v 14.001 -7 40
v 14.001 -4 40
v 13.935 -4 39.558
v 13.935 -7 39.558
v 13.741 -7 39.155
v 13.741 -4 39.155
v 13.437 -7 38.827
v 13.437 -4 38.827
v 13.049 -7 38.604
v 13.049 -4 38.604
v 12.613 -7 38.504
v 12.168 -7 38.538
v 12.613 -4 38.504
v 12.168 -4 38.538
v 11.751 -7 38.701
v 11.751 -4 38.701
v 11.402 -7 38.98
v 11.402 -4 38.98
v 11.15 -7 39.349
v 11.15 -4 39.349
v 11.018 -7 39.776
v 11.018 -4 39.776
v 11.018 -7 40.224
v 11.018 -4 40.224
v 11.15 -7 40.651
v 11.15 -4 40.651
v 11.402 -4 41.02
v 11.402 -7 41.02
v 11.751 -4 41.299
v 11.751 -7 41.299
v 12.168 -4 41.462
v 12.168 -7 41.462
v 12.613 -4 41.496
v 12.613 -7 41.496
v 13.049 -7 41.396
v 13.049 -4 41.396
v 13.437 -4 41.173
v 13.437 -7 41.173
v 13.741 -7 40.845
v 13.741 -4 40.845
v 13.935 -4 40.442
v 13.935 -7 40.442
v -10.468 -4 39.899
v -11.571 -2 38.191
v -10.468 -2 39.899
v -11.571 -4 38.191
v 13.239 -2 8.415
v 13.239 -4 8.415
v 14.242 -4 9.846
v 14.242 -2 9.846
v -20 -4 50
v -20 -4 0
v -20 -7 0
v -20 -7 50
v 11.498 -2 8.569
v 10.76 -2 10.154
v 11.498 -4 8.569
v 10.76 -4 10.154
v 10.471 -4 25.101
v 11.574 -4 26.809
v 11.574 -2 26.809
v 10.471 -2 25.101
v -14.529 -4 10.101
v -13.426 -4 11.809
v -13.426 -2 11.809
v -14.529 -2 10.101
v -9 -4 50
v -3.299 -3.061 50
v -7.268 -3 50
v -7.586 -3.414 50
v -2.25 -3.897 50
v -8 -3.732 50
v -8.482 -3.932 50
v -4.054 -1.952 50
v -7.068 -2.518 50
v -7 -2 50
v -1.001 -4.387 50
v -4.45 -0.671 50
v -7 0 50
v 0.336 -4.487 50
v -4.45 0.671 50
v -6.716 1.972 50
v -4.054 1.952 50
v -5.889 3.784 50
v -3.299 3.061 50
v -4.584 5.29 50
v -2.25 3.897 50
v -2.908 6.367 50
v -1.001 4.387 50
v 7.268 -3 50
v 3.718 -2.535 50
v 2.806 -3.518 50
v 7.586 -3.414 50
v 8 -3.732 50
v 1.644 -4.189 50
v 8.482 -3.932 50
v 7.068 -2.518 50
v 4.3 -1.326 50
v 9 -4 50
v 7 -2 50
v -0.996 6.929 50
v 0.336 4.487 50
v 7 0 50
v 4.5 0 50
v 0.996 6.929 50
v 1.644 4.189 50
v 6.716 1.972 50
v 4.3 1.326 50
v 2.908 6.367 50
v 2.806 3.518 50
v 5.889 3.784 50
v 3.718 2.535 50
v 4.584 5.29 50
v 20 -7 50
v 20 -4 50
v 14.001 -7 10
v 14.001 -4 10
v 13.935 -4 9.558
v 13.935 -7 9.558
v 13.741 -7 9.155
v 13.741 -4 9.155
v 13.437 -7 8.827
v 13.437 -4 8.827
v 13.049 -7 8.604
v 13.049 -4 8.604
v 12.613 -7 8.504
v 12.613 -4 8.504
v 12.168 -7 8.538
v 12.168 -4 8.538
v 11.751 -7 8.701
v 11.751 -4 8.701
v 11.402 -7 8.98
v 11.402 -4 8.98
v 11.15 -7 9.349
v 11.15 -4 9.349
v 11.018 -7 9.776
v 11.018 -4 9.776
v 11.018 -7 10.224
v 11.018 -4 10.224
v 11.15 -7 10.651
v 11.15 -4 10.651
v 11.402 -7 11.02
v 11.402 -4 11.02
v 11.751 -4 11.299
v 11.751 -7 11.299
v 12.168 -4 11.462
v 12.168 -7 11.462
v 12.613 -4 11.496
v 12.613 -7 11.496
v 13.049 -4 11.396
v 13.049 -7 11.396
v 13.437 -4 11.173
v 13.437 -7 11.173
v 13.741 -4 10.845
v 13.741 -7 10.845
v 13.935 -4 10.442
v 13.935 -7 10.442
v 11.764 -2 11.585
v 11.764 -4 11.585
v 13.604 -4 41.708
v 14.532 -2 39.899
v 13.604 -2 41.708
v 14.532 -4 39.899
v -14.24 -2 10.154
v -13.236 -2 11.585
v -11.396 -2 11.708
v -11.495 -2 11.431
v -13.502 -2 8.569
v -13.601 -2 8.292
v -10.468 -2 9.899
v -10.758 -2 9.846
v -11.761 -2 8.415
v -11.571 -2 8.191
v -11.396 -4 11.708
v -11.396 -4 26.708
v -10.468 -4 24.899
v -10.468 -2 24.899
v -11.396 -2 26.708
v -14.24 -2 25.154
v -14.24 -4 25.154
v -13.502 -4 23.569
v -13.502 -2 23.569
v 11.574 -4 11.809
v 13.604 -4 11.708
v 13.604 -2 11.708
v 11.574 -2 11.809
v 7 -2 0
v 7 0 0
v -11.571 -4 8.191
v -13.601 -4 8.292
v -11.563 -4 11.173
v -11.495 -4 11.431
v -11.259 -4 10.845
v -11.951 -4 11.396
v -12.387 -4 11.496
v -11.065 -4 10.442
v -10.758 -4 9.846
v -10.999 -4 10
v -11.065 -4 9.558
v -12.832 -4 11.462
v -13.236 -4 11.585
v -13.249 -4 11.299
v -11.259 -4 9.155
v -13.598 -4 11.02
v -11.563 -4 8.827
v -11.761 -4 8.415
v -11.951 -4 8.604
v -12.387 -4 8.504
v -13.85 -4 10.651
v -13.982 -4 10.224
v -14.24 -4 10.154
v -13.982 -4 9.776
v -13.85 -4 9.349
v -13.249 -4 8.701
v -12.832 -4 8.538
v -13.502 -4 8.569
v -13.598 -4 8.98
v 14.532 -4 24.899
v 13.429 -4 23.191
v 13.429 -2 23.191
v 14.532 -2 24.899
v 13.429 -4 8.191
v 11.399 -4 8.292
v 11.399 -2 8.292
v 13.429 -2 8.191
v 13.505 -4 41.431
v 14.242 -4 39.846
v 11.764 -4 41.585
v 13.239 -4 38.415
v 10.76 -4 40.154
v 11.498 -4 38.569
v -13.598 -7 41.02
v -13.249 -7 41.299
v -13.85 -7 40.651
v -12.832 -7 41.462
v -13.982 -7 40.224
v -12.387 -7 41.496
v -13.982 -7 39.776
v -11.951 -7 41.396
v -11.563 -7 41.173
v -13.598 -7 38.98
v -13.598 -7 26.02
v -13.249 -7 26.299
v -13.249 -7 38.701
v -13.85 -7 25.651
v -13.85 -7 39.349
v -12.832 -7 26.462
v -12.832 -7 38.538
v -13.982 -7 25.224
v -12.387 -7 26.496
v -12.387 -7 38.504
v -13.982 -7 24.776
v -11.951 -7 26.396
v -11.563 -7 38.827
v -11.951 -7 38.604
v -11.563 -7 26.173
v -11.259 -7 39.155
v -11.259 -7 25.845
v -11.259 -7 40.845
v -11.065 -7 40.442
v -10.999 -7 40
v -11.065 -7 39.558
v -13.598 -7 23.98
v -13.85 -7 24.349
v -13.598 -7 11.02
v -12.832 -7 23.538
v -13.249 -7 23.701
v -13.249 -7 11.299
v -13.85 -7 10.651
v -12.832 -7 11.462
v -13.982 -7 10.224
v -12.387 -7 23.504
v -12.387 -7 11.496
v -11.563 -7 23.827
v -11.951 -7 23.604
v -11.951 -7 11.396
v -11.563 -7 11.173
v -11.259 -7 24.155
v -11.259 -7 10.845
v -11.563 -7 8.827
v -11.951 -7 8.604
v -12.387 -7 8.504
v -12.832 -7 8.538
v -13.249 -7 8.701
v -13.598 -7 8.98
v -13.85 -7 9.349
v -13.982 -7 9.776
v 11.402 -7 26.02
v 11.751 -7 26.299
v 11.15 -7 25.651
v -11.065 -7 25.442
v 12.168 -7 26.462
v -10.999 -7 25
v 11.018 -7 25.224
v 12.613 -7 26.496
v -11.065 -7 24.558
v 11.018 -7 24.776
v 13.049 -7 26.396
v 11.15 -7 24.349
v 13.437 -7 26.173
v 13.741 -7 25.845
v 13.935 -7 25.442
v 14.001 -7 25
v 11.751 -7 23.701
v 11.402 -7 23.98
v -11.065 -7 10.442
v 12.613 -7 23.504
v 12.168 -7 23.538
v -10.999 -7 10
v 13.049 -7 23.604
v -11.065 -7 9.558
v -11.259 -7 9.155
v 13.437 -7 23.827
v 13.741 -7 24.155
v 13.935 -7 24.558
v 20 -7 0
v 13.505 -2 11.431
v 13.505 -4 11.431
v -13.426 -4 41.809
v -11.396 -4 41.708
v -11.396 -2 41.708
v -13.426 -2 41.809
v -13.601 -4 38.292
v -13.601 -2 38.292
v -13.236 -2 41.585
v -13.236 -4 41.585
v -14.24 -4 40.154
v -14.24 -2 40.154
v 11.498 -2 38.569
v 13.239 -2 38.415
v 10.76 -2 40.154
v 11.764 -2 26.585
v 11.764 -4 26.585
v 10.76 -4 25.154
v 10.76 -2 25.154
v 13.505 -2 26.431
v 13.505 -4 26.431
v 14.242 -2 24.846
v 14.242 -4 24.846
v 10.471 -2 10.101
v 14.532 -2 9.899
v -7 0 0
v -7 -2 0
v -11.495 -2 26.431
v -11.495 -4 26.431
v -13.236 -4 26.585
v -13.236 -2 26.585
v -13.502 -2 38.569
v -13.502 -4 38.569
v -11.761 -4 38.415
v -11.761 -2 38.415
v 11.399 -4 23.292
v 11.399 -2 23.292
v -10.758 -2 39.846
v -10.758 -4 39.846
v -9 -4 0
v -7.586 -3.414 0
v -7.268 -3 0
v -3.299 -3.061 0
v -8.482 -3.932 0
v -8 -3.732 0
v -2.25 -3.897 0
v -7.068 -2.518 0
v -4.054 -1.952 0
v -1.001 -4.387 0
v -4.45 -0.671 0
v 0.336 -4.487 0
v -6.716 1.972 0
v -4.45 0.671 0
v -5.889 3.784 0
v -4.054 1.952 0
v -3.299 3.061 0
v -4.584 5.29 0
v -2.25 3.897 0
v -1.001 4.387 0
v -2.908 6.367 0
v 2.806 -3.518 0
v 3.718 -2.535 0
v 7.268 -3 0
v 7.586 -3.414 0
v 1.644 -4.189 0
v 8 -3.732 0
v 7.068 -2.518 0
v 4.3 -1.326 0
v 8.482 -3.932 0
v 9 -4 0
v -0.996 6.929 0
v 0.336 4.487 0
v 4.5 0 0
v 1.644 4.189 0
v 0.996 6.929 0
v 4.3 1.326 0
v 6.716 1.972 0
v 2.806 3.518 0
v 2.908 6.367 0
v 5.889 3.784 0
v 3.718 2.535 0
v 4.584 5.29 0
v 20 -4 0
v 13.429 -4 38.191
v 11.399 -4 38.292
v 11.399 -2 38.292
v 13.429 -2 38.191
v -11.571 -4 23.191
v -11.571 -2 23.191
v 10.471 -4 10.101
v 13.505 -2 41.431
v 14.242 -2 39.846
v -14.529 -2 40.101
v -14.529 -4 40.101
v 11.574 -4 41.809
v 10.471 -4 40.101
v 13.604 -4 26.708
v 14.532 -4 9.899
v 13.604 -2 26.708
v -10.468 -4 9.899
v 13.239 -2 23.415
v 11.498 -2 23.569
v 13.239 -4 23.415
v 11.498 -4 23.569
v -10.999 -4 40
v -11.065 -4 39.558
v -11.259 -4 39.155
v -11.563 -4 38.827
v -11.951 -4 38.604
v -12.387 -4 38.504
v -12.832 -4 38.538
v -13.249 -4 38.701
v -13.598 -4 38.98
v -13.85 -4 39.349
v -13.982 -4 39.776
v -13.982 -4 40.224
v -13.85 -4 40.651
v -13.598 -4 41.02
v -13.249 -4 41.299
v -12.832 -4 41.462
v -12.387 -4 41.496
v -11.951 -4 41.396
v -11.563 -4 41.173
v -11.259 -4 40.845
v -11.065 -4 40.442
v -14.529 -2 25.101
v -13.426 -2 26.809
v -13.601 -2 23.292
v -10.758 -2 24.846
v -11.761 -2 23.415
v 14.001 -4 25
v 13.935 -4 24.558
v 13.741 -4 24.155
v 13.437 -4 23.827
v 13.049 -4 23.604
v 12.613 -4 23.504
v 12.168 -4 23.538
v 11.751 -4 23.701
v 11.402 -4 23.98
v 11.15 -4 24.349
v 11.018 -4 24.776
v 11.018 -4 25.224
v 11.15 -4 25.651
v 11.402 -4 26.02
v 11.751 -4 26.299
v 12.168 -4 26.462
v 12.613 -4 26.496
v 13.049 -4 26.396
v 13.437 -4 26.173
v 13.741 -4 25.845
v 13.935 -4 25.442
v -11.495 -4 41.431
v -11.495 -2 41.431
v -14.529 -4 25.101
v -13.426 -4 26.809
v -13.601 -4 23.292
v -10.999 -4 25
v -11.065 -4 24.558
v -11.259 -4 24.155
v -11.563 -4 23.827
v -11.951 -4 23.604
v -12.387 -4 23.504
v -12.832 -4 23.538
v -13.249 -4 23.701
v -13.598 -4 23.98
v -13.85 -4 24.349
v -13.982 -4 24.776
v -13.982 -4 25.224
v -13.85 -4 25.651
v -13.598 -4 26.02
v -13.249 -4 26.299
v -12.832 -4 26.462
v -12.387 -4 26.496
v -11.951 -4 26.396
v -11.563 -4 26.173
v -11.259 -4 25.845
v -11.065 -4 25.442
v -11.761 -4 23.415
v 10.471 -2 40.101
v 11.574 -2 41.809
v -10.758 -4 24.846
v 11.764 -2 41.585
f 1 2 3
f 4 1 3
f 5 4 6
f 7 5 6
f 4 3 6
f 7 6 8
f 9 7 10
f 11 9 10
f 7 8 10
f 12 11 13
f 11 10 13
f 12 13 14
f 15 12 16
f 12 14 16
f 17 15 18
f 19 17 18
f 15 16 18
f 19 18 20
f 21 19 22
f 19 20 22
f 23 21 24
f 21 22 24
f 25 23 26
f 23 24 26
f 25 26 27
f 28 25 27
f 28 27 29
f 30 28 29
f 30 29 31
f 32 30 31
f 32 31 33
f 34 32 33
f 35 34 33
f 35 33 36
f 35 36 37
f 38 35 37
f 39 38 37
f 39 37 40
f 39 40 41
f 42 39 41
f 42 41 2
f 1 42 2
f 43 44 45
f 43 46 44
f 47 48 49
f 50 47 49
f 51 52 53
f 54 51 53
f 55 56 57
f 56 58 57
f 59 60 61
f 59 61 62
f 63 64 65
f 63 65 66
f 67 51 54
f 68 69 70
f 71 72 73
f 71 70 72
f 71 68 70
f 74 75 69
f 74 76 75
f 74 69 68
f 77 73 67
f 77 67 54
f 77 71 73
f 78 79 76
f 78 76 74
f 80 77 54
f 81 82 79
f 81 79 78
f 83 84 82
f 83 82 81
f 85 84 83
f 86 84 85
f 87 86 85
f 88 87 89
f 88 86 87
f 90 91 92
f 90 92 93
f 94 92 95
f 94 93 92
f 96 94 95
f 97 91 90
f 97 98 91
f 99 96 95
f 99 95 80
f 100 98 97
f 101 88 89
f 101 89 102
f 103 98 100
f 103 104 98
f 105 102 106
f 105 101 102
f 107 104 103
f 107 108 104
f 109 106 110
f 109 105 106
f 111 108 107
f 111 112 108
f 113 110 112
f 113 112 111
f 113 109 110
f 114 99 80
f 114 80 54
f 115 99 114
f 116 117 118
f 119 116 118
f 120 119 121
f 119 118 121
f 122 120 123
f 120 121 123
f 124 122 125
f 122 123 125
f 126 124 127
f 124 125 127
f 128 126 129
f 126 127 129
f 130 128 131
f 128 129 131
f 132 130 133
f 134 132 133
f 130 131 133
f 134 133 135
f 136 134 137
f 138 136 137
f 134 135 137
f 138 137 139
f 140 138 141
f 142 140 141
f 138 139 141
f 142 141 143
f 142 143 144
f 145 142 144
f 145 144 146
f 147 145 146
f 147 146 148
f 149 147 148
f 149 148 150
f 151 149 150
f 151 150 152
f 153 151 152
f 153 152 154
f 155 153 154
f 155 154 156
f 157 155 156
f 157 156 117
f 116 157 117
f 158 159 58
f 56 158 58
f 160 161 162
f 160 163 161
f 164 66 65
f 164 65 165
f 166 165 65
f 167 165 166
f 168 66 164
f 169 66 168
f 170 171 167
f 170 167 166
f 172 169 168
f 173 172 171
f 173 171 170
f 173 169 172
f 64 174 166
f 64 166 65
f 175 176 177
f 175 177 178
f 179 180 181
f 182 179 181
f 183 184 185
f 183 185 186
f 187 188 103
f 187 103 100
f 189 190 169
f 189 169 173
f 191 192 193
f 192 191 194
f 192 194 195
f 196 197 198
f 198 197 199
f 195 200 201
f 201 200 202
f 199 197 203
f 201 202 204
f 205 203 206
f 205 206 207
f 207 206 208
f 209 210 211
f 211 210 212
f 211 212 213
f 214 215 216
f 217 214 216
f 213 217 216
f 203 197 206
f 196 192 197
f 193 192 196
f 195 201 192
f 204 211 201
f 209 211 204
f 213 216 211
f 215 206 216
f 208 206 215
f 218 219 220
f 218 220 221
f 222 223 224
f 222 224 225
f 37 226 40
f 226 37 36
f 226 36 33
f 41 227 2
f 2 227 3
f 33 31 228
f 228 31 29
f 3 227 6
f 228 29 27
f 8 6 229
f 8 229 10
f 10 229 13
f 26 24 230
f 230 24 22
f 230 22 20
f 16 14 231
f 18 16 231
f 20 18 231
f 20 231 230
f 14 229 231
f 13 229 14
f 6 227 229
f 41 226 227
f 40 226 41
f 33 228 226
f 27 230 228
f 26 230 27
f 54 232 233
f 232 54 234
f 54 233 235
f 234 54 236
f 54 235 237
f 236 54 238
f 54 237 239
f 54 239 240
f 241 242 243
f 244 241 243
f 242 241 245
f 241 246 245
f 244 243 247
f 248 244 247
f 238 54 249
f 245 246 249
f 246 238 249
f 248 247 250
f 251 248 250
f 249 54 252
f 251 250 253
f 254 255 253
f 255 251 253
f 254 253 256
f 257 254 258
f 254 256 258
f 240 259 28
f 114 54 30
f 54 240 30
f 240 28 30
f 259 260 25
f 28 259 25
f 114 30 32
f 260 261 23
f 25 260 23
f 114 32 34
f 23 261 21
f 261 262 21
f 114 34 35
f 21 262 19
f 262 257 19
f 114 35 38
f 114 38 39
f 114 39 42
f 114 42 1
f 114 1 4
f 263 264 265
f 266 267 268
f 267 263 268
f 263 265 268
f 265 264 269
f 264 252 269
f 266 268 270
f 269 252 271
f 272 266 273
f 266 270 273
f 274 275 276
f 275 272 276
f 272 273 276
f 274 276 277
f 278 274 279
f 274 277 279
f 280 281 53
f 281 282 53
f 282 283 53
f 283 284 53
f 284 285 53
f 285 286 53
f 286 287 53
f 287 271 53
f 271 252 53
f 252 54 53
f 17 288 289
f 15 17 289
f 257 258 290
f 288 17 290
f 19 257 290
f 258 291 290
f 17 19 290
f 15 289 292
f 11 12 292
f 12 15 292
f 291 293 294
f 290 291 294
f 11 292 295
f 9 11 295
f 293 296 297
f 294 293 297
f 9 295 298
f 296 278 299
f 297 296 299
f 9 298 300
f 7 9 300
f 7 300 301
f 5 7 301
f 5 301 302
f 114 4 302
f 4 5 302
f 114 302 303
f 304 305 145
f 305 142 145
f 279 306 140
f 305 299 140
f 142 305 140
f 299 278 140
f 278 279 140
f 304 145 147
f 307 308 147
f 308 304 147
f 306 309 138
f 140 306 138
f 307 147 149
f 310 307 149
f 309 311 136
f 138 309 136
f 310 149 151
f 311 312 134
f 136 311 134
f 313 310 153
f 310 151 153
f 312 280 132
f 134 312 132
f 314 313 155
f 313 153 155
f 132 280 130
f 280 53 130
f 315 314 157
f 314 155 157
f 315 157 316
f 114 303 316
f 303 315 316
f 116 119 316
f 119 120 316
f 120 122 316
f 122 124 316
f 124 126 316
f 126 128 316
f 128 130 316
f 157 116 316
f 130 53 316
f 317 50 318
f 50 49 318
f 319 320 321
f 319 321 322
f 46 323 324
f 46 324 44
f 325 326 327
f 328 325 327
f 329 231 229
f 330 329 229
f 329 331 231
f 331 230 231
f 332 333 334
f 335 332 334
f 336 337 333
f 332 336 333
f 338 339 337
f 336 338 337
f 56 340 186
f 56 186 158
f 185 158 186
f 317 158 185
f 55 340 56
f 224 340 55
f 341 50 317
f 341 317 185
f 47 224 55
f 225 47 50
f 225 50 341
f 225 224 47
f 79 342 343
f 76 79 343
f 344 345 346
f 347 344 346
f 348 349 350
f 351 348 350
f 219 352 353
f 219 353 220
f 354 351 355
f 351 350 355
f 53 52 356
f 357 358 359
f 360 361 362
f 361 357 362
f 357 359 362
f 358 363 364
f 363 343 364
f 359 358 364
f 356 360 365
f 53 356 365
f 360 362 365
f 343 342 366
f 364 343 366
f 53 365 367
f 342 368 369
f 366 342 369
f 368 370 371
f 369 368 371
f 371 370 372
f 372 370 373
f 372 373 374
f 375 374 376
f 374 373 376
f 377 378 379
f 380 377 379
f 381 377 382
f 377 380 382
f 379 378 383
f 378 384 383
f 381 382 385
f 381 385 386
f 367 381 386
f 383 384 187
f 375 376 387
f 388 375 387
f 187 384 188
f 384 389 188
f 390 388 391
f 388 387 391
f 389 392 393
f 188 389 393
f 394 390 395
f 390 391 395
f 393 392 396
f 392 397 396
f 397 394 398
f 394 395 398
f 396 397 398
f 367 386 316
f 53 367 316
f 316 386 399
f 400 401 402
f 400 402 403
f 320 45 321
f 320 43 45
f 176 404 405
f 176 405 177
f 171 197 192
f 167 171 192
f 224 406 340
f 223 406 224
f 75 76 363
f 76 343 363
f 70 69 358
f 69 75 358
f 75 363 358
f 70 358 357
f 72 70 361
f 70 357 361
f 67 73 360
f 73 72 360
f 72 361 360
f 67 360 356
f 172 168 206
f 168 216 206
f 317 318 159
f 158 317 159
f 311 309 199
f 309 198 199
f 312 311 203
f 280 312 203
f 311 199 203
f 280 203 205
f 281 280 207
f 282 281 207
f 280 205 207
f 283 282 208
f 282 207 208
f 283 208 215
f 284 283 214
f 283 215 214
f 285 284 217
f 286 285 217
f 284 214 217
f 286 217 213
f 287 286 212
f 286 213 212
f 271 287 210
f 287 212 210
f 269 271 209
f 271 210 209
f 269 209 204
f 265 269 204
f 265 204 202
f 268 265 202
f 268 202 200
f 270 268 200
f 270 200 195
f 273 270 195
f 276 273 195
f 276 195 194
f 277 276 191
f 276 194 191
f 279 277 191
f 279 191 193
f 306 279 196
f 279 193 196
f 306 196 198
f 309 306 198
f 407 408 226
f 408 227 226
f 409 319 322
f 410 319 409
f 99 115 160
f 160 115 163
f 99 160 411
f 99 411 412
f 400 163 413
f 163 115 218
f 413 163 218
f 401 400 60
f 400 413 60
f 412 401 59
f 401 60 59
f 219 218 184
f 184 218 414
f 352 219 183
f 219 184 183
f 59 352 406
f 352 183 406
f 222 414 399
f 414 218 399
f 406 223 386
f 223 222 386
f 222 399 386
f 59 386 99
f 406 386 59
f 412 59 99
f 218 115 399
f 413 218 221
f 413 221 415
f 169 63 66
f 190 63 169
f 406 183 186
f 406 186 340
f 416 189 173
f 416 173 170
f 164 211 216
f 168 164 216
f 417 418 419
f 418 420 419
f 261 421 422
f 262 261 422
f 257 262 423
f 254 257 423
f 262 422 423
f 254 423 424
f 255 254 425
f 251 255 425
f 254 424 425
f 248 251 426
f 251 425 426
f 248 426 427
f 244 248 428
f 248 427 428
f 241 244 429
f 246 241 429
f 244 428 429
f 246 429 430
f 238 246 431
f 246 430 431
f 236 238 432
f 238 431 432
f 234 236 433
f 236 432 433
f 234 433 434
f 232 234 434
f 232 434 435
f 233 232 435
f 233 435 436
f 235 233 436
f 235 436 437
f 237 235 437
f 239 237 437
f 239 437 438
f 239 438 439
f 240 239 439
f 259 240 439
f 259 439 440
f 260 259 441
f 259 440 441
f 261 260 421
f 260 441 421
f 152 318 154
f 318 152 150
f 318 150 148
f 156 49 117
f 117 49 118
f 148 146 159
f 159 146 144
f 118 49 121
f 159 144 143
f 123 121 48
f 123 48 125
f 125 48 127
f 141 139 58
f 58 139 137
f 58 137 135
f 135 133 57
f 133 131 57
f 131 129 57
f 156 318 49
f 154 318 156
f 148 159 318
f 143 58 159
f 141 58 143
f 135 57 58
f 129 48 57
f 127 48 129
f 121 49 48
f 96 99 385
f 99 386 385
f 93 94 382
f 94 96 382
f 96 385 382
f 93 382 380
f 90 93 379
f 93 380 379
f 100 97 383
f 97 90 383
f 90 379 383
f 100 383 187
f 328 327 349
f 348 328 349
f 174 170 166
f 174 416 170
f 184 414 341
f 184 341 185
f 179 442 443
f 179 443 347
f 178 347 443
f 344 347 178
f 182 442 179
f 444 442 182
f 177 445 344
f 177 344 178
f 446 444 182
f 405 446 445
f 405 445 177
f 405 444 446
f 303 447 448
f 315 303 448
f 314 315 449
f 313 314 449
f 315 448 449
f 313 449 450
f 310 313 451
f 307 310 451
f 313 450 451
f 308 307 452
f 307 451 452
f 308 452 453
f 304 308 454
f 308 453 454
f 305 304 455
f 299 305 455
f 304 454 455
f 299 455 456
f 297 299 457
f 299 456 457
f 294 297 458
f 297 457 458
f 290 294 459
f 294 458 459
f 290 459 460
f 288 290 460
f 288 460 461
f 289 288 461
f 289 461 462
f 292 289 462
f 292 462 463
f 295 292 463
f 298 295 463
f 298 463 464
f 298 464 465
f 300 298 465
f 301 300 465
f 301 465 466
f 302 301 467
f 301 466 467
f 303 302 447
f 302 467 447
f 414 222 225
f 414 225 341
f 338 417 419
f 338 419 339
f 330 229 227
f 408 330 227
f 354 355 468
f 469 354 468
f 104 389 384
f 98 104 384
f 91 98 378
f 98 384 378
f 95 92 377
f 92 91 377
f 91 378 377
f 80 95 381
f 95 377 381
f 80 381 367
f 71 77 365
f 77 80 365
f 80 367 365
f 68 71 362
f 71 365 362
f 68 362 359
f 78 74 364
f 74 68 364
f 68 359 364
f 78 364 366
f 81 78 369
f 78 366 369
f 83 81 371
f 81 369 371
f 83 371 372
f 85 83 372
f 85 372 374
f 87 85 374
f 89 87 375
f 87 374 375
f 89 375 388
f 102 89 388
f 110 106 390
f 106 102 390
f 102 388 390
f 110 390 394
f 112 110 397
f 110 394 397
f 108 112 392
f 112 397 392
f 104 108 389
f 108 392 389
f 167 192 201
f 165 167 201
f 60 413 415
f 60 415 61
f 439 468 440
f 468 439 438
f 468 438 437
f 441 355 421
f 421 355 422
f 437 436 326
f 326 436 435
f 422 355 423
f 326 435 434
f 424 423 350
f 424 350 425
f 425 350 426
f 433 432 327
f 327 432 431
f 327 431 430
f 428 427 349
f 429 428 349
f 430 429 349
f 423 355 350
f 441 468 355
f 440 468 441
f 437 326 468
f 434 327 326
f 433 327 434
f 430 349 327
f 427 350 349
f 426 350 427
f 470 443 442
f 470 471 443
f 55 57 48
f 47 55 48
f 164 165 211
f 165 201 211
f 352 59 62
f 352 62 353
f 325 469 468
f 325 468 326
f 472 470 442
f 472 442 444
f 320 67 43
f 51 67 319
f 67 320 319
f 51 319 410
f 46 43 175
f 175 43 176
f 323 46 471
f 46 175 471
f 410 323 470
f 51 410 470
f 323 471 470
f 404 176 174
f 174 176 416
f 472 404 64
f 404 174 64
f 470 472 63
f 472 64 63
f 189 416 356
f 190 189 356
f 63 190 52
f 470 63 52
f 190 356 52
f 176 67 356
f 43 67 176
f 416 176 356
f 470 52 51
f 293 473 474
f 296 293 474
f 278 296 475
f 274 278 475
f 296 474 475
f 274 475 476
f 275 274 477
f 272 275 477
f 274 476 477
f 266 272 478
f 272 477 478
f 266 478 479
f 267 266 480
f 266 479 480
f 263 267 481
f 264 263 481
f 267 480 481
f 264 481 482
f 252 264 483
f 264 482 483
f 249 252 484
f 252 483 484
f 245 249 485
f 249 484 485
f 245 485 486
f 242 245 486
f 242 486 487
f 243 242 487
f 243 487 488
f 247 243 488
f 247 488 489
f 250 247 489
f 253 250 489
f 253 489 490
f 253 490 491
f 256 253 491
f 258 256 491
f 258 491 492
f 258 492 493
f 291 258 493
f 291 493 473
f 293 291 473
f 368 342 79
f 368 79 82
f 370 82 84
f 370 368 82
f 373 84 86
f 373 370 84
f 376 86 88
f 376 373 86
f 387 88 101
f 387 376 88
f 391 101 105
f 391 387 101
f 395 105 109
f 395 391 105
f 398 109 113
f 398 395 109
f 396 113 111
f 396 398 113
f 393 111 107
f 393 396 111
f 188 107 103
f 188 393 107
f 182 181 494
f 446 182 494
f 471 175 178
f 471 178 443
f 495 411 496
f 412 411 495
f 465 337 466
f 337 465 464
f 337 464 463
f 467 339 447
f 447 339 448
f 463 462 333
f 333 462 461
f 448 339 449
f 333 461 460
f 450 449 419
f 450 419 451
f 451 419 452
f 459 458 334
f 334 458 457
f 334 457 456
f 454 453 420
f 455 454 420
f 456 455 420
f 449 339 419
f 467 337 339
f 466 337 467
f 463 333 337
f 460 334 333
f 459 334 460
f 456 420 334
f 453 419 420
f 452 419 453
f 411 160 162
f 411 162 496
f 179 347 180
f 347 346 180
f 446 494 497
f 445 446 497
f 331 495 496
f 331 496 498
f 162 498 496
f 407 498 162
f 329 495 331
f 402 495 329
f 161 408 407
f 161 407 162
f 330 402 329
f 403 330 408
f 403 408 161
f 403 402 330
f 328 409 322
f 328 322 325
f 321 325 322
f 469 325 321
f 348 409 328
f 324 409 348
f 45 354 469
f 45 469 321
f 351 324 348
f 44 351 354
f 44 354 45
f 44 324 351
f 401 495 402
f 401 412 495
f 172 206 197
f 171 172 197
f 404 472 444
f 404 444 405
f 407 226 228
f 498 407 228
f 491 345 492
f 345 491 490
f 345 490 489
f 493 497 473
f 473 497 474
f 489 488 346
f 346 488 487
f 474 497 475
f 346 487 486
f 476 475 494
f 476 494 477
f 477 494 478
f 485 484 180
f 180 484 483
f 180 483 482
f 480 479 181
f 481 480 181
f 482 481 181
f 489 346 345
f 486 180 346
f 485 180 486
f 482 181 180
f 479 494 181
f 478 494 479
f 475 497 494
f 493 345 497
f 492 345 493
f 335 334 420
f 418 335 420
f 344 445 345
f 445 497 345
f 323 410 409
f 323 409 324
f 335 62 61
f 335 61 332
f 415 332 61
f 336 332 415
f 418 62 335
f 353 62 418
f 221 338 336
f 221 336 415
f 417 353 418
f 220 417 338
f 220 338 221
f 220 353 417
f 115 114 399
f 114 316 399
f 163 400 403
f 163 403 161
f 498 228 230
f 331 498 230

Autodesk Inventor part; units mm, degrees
ref_plane "YZ Plane" through (0, 0, 0) normal (1, 0, 0) x (0, 1, 0)
ref_plane "XZ Plane" through (0, 0, 0) normal (0, 1, 0) x (-1, 0, 0)
ref_plane "XY Plane" through (0, 0, 0) normal (0, 0, 1) x (1, 0, 0)
sketch "Эскиз1" plane through (0, 0, 0) normal (0, 0, 1) x (1, 0, 0)
  circle A0 centre (0, 0) radius 4.5
  line L0 (-9, -4) -> (-20, -4)
  line L1 (-20, -4) -> (-20, -5)
  line L2 (20, -5) -> (20, -4)
  line L3 (20, -4) -> (9, -4)
  line L4 (-20, -5) -> (-20, -7)
  line L5 (-20, -7) -> (20, -7)
  line L6 (20, -7) -> (20, -5)
  arc A1 (7, 0) -> (-7, 0) centre (0, 0) ccw
  line L7 (-7, 0) -> (-7, -2)
  line L8 (7, 0) -> (7, -2)
  arc A2 (-9, -4) -> (-7, -2) centre (-9, -2) ccw
  arc A3 (7, -2) -> (9, -4) centre (9, -2) ccw
  point P0 (3, -4)
  point P1 (-5, 0)
  point P2 (-5, -4)
  point P3 (5, 0)
  point P4 (5, -4)
  dimension "d0" = 9
  dimension "d2" = 1
  dimension "d20" = 2
  dimension "d21" = 14
  dimension "d22" = 2
extrude "Выдавливание4" add sketch "Эскиз1" along normal blind 50
sketch "Эскиз3" plane through (9, -4, 0) normal (0, 1, 0) x (1, 0, 0)
  circle A0 centre (-21.4987, -10) radius 1.5
  circle A1 centre (-21.4987, -25) radius 1.5
  circle A2 centre (-21.4987, -40) radius 1.5
  circle A3 centre (3.5013, -10) radius 1.5
  circle A4 centre (3.5013, -25) radius 1.5
  circle A5 centre (3.5013, -40) radius 1.5
  line L0 (5.2423, -9.8461) -> (4.5051, -11.4308)
  line L1 (4.5051, -11.4308) -> (2.7641, -11.5846)
  line L2 (2.7641, -11.5846) -> (1.7604, -10.1539)
  line L3 (1.7604, -10.1539) -> (2.4976, -8.5692)
  line L4 (2.4976, -8.5692) -> (4.2386, -8.4154)
  line L5 (4.2386, -8.4154) -> (5.2423, -9.8461)
  line L6 (2.3986, -8.2924) -> (4.4288, -8.1912)
  line L7 (4.4288, -8.1912) -> (5.5315, -9.8988)
  line L8 (5.5315, -9.8988) -> (4.604, -11.7076)
  line L9 (4.604, -11.7076) -> (2.5739, -11.8088)
  line L10 (2.5739, -11.8088) -> (1.4712, -10.1012)
  line L11 (1.4712, -10.1012) -> (2.3986, -8.2924)
  line L12 (3.5013, -10) -> (2.0013, -10)
  line L13 (3.5013, -10) -> (3.5013, -11.5)
  line L14 (1.4712, -25.1012) -> (2.3986, -23.2924)
  line L15 (2.3986, -23.2924) -> (4.4288, -23.1912)
  line L16 (4.4288, -23.1912) -> (5.5315, -24.8988)
  line L17 (4.2386, -23.4154) -> (5.2423, -24.8461)
  line L18 (2.4976, -23.5692) -> (4.2386, -23.4154)
  line L19 (1.7604, -25.1539) -> (2.4976, -23.5692)
  line L20 (2.7641, -26.5846) -> (1.7604, -25.1539)
  line L21 (2.5739, -26.8088) -> (1.4712, -25.1012)
  line L22 (4.604, -26.7076) -> (2.5739, -26.8088)
  line L23 (4.5051, -26.4308) -> (2.7641, -26.5846)
  line L24 (5.2423, -24.8461) -> (4.5051, -26.4308)
  line L25 (5.5315, -24.8988) -> (4.604, -26.7076)
  line L26 (1.4712, -40.1012) -> (2.3986, -38.2924)
  line L27 (2.3986, -38.2924) -> (4.4288, -38.1912)
  line L28 (4.4288, -38.1912) -> (5.5315, -39.8988)
  line L29 (4.2386, -38.4154) -> (5.2423, -39.8461)
  line L30 (2.4976, -38.5692) -> (4.2386, -38.4154)
  line L31 (1.7604, -40.1539) -> (2.4976, -38.5692)
  line L32 (2.7641, -41.5846) -> (1.7604, -40.1539)
  line L33 (2.5739, -41.8088) -> (1.4712, -40.1012)
  line L34 (4.604, -41.7076) -> (2.5739, -41.8088)
  line L35 (4.5051, -41.4308) -> (2.7641, -41.5846)
  line L36 (5.2423, -39.8461) -> (4.5051, -41.4308)
  line L37 (5.5315, -39.8988) -> (4.604, -41.7076)
  line L38 (-23.5288, -10.1012) -> (-22.6014, -8.2924)
  line L39 (-22.6014, -8.2924) -> (-20.5712, -8.1912)
  line L40 (-20.5712, -8.1912) -> (-19.4685, -9.8988)
  line L41 (-20.7614, -8.4154) -> (-19.7577, -9.8461)
  line L42 (-22.5024, -8.5692) -> (-20.7614, -8.4154)
  line L43 (-23.2396, -10.1539) -> (-22.5024, -8.5692)
  line L44 (-22.2359, -11.5846) -> (-23.2396, -10.1539)
  line L45 (-22.4261, -11.8088) -> (-23.5288, -10.1012)
  line L46 (-20.396, -11.7076) -> (-22.4261, -11.8088)
  line L47 (-20.4949, -11.4308) -> (-22.2359, -11.5846)
  line L48 (-19.7577, -9.8461) -> (-20.4949, -11.4308)
  line L49 (-19.4685, -9.8988) -> (-20.396, -11.7076)
  line L50 (-23.5288, -25.1012) -> (-22.6014, -23.2924)
  line L51 (-22.6014, -23.2924) -> (-20.5712, -23.1912)
  line L52 (-20.5712, -23.1912) -> (-19.4685, -24.8988)
  line L53 (-20.7614, -23.4154) -> (-19.7577, -24.8461)
  line L54 (-22.5024, -23.5692) -> (-20.7614, -23.4154)
  line L55 (-23.2396, -25.1539) -> (-22.5024, -23.5692)
  line L56 (-22.2359, -26.5846) -> (-23.2396, -25.1539)
  line L57 (-22.4261, -26.8088) -> (-23.5288, -25.1012)
  line L58 (-20.396, -26.7076) -> (-22.4261, -26.8088)
  line L59 (-20.4949, -26.4308) -> (-22.2359, -26.5846)
  line L60 (-19.7577, -24.8461) -> (-20.4949, -26.4308)
  line L61 (-19.4685, -24.8988) -> (-20.396, -26.7076)
  line L62 (-23.5288, -40.1012) -> (-22.6014, -38.2924)
  line L63 (-22.6014, -38.2924) -> (-20.5712, -38.1912)
  line L64 (-20.5712, -38.1912) -> (-19.4685, -39.8988)
  line L65 (-20.7614, -38.4154) -> (-19.7577, -39.8461)
  line L66 (-22.5024, -38.5692) -> (-20.7614, -38.4154)
  line L67 (-23.2396, -40.1539) -> (-22.5024, -38.5692)
  line L68 (-22.2359, -41.5846) -> (-23.2396, -40.1539)
  line L69 (-22.4261, -41.8088) -> (-23.5288, -40.1012)
  line L70 (-20.396, -41.7076) -> (-22.4261, -41.8088)
  line L71 (-20.4949, -41.4308) -> (-22.2359, -41.5846)
  line L72 (-19.7577, -39.8461) -> (-20.4949, -41.4308)
  line L73 (-19.4685, -39.8988) -> (-20.396, -41.7076)
  point P0 (-9, 0)
  dimension "d51" = 15
  dimension "d54" = 25
extrude "Выдавливание5" cut sketch "Эскиз3" against normal blind 3 contours A0
extrude "Выдавливание6" cut sketch "Эскиз3" against normal blind 3 contours A1 | A2 | A3 L13 L12 | L12 L13 A3 | A4 | A5
extrude "Выдавливание7" add sketch "Эскиз3" along normal blind 2 contours L6 L7 L8 L9 L10 L11 | L14 L15 L16 L25 L22 L21 | L26 L27 L28 L37 L34 L33 | L38 L39 L40 L49 L46 L45 | L50 L51 L52 L61 L58 L57 | L62 L63 L64 L73 L70 L69
properties part number "крепление направляющей руки"
